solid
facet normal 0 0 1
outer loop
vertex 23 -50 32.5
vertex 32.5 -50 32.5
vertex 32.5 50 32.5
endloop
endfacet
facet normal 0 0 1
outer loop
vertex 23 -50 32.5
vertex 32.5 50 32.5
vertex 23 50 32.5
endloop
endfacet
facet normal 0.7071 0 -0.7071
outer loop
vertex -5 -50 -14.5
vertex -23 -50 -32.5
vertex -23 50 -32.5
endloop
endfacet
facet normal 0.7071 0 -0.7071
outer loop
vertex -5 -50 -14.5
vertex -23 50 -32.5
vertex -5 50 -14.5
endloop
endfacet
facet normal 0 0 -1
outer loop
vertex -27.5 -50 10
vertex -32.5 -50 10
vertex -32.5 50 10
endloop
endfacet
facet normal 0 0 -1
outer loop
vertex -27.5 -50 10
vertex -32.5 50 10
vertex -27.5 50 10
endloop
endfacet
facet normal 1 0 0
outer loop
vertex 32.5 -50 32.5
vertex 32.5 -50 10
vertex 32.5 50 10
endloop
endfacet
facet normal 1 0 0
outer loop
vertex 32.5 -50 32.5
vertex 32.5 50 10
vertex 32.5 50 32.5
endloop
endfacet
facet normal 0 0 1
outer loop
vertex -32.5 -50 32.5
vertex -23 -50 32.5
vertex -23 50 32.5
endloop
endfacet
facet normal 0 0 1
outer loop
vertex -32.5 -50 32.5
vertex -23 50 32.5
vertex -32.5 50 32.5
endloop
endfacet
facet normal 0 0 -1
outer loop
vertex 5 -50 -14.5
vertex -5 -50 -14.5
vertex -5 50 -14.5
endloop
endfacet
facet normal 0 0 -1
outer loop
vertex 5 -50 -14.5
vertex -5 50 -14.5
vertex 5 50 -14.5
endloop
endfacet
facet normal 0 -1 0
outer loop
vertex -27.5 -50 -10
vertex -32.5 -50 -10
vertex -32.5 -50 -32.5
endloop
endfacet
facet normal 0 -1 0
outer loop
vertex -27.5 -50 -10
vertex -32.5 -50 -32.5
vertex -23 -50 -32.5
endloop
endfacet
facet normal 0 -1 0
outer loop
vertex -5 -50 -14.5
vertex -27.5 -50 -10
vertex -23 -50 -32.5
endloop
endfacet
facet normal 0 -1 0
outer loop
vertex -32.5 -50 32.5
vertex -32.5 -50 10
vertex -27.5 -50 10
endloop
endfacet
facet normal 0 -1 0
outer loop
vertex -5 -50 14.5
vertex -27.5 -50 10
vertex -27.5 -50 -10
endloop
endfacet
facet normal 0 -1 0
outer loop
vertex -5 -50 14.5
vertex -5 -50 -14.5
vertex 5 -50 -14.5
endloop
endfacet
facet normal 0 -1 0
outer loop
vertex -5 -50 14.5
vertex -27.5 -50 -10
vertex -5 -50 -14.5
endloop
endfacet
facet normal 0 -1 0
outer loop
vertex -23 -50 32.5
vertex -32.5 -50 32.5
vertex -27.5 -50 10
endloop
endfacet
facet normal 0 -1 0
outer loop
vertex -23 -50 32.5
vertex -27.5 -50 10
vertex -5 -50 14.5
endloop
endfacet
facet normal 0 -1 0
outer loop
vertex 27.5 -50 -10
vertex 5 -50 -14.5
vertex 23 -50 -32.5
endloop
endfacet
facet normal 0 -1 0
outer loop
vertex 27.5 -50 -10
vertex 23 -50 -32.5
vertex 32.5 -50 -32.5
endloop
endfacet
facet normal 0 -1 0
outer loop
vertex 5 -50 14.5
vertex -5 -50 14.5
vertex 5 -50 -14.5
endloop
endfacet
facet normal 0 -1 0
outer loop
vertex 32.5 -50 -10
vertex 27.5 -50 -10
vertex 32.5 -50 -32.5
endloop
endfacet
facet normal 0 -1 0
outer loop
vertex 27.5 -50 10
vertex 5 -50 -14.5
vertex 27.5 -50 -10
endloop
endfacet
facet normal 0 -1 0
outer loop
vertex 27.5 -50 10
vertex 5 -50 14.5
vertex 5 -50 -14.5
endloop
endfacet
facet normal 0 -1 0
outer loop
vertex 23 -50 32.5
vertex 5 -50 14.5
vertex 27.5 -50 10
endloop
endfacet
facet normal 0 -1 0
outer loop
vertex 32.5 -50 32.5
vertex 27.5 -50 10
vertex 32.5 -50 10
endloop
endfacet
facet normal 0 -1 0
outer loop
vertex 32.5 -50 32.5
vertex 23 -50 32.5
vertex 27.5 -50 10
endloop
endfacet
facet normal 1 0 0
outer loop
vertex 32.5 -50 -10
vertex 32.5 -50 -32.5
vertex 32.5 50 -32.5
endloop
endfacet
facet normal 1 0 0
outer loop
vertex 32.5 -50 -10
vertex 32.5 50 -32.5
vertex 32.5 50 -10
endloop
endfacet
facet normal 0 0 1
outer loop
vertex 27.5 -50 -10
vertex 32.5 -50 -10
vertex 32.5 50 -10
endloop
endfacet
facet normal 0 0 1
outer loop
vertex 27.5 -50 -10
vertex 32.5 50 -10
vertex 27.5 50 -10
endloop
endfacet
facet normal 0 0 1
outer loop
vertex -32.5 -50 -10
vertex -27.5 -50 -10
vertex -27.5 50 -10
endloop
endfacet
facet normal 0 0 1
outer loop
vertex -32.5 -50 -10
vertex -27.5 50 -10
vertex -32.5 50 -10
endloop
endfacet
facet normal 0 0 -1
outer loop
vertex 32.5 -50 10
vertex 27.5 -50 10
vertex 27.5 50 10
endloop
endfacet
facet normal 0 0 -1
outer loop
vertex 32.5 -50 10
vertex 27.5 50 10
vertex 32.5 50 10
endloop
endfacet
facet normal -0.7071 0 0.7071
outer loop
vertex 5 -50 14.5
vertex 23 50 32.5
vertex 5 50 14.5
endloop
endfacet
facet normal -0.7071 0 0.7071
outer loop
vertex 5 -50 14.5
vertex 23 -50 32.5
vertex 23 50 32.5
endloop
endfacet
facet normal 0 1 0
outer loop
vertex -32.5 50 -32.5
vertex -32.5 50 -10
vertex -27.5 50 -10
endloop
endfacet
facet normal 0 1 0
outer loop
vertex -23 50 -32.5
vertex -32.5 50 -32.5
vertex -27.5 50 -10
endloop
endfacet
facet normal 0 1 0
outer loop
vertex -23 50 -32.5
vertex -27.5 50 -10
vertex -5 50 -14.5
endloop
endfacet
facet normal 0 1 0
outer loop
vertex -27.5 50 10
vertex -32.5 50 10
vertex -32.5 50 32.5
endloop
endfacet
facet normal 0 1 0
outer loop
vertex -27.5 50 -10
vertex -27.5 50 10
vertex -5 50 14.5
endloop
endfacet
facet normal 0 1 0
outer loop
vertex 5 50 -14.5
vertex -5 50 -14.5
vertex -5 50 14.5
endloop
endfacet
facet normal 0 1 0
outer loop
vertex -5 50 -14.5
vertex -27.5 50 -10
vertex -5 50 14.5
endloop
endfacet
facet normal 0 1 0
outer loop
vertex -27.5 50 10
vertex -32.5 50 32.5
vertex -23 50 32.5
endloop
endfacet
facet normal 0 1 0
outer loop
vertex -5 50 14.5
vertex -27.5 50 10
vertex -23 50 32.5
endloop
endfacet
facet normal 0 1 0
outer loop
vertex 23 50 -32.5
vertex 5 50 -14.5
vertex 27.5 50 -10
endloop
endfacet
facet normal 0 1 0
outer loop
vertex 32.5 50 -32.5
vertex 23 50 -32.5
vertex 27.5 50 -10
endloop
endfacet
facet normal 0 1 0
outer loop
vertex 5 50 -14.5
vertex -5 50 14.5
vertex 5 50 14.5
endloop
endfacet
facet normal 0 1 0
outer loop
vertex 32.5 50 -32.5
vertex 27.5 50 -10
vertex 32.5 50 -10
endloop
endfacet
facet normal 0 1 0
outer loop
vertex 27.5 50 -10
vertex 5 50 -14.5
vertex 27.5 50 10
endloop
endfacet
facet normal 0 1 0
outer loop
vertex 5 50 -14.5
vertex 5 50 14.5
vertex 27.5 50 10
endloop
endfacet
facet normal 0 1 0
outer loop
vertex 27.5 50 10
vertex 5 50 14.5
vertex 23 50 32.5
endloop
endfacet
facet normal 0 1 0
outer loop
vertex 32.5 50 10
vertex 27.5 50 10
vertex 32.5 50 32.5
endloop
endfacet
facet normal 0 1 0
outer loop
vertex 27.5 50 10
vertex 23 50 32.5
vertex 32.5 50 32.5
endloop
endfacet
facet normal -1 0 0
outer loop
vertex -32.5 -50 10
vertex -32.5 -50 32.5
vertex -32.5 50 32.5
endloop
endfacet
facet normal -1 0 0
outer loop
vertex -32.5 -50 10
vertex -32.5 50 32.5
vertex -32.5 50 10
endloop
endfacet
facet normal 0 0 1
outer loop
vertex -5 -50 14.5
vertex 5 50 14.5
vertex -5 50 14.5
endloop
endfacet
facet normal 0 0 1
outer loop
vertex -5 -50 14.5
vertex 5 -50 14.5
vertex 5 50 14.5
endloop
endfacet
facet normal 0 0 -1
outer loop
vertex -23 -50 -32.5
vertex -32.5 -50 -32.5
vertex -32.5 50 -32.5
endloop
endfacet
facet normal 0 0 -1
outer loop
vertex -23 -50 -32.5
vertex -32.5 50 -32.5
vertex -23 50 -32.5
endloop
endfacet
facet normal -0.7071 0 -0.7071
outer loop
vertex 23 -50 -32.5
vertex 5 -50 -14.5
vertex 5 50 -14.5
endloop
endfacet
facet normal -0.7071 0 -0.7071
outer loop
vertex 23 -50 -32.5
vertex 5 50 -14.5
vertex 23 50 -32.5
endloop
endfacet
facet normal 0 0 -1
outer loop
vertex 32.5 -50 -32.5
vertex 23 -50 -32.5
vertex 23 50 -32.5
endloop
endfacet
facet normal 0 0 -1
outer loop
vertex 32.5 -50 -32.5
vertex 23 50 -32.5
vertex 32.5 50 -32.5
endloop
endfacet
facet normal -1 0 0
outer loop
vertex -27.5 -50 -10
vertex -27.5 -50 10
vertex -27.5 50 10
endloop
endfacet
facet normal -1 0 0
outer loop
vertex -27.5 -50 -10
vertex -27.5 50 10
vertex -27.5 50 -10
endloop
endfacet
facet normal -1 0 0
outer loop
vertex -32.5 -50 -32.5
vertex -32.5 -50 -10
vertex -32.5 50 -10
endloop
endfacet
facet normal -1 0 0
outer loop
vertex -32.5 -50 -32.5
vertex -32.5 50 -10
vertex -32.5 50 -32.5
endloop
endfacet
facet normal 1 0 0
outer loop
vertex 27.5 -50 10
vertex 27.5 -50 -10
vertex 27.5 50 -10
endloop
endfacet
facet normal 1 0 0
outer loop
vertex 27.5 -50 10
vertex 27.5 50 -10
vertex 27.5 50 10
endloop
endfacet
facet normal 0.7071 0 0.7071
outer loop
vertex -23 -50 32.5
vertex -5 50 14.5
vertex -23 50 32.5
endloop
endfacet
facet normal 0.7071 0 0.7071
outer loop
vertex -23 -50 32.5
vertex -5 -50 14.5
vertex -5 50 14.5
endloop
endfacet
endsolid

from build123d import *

# Parameters (mm, degrees)
F1_DEPTH = 50


with BuildPart() as f1:
    # F0 (on Front) → F1 (new body, symmetric)
    with BuildSketch(Plane.XZ):
        Polygon((0, -14.5), (0, 14.5), (-5, 14.5), (-23, 32.5), (-32.5, 32.5), (-32.5, 10), (-27.5, 10), (-27.5, -10), (-32.5, -10), (-32.5, -32.5), (-23, -32.5), (-5, -14.5), align=None)
        Polygon((5, 14.5), (0, 14.5), (0, -14.5), (5, -14.5), (23, -32.5), (32.5, -32.5), (32.5, -10), (27.5, -10), (27.5, 10), (32.5, 10), (32.5, 32.5), (23, 32.5), align=None)
    extrude(amount=F1_DEPTH, both=True)


solid = f1.part
